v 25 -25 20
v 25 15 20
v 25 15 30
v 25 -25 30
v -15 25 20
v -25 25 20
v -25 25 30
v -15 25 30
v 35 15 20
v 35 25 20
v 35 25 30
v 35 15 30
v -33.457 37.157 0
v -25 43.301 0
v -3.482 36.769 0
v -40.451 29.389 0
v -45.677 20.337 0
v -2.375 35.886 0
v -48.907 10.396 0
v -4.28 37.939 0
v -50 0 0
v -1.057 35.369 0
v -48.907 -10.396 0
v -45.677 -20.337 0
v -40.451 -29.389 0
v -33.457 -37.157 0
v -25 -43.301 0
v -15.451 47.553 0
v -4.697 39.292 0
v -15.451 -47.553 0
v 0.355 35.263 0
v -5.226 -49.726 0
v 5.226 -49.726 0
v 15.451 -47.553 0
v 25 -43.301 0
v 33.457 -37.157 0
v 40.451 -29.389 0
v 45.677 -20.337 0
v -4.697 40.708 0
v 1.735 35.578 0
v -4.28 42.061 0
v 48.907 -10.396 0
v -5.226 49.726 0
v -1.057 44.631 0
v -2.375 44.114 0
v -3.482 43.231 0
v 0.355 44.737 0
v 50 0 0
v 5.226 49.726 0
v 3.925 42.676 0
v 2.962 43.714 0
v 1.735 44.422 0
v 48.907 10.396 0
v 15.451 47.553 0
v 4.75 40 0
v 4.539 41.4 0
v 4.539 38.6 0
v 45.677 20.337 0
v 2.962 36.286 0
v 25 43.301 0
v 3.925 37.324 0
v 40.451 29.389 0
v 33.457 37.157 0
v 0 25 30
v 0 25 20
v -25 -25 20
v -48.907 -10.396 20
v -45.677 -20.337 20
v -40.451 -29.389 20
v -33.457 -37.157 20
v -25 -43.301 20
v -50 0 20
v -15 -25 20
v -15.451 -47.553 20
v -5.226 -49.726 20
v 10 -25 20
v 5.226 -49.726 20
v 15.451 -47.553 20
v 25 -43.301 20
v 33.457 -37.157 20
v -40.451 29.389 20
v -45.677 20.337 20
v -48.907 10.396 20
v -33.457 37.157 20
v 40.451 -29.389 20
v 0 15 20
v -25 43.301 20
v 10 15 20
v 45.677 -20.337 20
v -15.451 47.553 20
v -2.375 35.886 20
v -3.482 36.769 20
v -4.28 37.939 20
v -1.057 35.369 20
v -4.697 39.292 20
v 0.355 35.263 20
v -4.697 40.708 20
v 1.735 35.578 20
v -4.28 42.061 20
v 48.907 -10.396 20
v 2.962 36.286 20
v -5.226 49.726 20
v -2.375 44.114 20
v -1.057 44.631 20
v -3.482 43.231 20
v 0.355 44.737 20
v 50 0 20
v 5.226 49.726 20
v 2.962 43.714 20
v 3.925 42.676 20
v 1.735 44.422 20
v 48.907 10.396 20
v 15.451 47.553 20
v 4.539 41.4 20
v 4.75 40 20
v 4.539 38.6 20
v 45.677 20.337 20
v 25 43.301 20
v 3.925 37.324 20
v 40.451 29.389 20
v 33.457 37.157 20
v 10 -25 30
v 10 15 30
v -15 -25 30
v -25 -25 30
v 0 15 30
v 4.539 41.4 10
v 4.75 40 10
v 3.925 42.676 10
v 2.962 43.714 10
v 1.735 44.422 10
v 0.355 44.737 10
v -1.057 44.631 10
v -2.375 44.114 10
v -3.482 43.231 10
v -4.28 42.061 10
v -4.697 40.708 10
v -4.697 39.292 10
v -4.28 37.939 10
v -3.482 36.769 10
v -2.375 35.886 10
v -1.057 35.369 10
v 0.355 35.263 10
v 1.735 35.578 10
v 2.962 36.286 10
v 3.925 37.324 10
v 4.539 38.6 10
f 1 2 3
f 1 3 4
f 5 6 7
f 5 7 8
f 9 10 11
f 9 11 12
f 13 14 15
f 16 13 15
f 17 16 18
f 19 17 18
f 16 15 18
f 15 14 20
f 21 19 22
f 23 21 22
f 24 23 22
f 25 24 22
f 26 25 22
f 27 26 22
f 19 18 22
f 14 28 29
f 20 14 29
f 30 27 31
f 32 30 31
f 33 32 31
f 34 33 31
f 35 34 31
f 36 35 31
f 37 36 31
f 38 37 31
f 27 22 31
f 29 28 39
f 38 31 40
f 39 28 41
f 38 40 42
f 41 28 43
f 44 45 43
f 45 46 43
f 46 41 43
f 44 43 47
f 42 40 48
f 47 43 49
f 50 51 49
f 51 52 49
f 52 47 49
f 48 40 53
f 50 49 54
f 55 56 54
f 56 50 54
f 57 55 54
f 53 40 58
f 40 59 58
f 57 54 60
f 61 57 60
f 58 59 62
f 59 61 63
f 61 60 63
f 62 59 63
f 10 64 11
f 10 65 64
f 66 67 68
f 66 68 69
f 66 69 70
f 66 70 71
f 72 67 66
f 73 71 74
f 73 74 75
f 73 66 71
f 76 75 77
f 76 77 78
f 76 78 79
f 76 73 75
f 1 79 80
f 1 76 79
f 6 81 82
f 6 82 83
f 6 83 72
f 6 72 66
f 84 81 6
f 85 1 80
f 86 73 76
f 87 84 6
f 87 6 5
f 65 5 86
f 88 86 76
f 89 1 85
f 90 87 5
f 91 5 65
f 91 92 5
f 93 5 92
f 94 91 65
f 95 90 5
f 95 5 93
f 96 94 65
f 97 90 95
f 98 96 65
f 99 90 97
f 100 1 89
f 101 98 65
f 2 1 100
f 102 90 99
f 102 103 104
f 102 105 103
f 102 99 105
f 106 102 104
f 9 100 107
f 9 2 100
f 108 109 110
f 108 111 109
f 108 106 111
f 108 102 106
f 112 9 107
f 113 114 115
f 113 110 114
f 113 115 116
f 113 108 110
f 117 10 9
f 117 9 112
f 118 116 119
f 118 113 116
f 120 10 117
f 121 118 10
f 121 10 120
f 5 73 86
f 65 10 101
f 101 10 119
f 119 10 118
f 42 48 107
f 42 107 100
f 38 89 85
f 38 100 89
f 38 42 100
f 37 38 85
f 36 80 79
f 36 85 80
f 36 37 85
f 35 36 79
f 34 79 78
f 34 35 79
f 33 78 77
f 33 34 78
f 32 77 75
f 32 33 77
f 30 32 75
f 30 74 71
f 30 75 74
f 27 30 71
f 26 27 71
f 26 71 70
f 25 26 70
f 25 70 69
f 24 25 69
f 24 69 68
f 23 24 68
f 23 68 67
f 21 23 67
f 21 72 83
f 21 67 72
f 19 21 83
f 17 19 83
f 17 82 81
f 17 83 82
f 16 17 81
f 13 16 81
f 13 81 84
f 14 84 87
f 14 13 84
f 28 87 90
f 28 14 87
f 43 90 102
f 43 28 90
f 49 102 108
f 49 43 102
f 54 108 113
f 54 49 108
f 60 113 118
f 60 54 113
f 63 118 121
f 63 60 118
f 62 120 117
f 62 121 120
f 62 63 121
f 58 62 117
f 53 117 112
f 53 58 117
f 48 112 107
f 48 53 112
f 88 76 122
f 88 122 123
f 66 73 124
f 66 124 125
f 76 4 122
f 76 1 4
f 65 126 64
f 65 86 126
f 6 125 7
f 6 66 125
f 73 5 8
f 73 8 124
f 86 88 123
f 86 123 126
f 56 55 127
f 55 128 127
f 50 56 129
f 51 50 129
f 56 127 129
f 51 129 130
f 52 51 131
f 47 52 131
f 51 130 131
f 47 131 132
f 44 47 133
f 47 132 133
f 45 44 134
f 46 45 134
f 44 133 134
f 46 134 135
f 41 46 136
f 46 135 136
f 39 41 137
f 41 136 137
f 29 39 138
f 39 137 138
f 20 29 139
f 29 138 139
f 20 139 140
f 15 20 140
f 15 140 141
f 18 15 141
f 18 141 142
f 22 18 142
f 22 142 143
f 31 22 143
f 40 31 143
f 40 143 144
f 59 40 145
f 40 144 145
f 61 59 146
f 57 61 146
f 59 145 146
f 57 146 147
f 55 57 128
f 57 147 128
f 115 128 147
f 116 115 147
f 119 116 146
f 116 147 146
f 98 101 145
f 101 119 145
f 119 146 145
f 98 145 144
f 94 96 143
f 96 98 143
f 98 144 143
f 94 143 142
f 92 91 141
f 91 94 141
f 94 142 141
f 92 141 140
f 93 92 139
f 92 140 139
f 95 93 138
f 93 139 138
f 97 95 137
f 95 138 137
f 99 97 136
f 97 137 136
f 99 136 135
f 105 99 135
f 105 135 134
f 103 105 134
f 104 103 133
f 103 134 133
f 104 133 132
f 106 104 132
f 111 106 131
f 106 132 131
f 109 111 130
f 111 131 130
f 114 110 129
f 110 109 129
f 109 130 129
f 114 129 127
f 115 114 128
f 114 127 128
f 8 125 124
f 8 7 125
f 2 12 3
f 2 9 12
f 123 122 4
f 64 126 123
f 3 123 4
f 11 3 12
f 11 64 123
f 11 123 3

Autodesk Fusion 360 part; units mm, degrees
sketch "スケッチ1" plane through (0, 0, 0) normal (0, 0, 1) x (1, 0, 0)
  circle A0 centre (0, 0) radius 50
extrude "押し出し1" add sketch "スケッチ1" along normal blind 10
sketch "スケッチ2" plane through (0, 0, 10) normal (0, 0, 1) x (1, 0, 0)
  circle A0 centre (0, 0) radius 50
  circle A1 centre (0, 40) radius 4.7499
extrude "押し出し2" cut sketch "スケッチ2" against normal blind 10 contours A1
sketch "スケッチ3" plane through (0, 0, 10) normal (0, 0, 1) x (1, 0, 0)
  circle A0 centre (0, 40) radius 4.7499
  circle A1 centre (0, 0) radius 50
sketch "スケッチ4" plane through (0, 0, 10) normal (0, 0, 1) x (1, 0, 0)
sketch "スケッチ5" plane through (0, 0, 10) normal (0, 0, 1) x (1, 0, 0)
sketch "スケッチ6" plane through (0, 0, 10) normal (0, 0, 1) x (1, 0, 0)
sketch "スケッチ7" plane through (0, 0, 10) normal (0, 0, 1) x (1, 0, 0)
sketch "スケッチ8" plane through (0, 0, 10) normal (0, 0, 1) x (1, 0, 0)
sketch "スケッチ9" plane through (0, 0, 10) normal (0, 0, 1) x (1, 0, 0)
sketch "スケッチ10" plane through (0, 0, 10) normal (0, 0, 1) x (1, 0, 0)
sketch "スケッチ11" plane through (0, 0, 10) normal (0, 0, 1) x (1, 0, 0)
sketch "スケッチ12" plane through (0, 0, 10) normal (0, 0, 1) x (1, 0, 0)
sketch "スケッチ13" plane through (0, 0, 10) normal (0, 0, 1) x (1, 0, 0)
sketch "スケッチ14" plane through (0, 0, 10) normal (0, 0, 1) x (1, 0, 0)
  line L0 (-25, 25) -> (-15, 25)
  line L1 (-15, 25) -> (-15, -30)
  line L2 (-15, -30) -> (-25, -30)
  line L3 (-25, -30) -> (-25, 25)
  line L4 (0, 25) -> (35, 25)
  line L5 (35, 25) -> (35, 15)
  line L6 (35, 15) -> (0, 15)
  line L7 (0, 15) -> (0, 25)
  line L8 (10, 15) -> (25, 15)
  line L9 (25, 15) -> (25, -30)
  line L10 (25, -30) -> (10, -30)
  line L11 (10, -30) -> (10, 15)
extrude "押し出し3" add sketch "スケッチ14" sketch "スケッチ3" along normal blind 10 contours L0 L1 L2 L3 of sketch 2
sketch "スケッチ15" plane through (0, 0, 20) normal (0, 0, 1) x (1, 0, 0)
  circle A0 centre (0, 40) radius 4.7499
  circle A1 centre (0, 0) radius 50
  line L0 (-25, 25) -> (-15, 25)
  line L1 (-15, 25) -> (-15, -25)
  line L2 (-15, -25) -> (-25, -25)
  line L3 (-25, -25) -> (-25, 25)
  line L4 (0, 25) -> (25, 25)
  line L5 (25, 25) -> (25, 15)
  line L6 (25, 15) -> (0, 15)
  line L7 (0, 15) -> (0, 25)
  line L8 (10, 15) -> (15, 15)
  line L9 (15, 15) -> (15, -25)
  line L10 (15, -25) -> (10, -25)
  line L11 (10, -25) -> (10, 15)
extrude "押し出し4" add sketch "スケッチ15" along normal blind 10 contours L0 L1 L2 L3
sketch "スケッチ16" plane through (0, 0, 20) normal (0, 0, 1) x (1, 0, 0)
  line L0 (-25, -25) -> (-25, 25)
  line L1 (-25, 25) -> (-15, 25)
  line L2 (-15, 25) -> (-15, -25)
  line L3 (-15, -25) -> (-25, -25)
  circle A0 centre (0, 40) radius 4.7499
  circle A1 centre (0, 0) radius 50
  line L4 (0, 25) -> (35, 25)
  line L5 (35, 25) -> (35, 15)
  line L6 (35, 15) -> (0, 15)
  line L7 (0, 15) -> (0, 25)
  line L8 (10, 15) -> (25, 15)
  line L9 (25, 15) -> (25, -25)
  line L10 (25, -25) -> (10, -25)
  line L11 (10, -25) -> (10, 15)
extrude "押し出し5" add sketch "スケッチ16" along normal blind 10 contours L4 L5 L6 L7 L8 | L6 L8 L9 L10 L11
